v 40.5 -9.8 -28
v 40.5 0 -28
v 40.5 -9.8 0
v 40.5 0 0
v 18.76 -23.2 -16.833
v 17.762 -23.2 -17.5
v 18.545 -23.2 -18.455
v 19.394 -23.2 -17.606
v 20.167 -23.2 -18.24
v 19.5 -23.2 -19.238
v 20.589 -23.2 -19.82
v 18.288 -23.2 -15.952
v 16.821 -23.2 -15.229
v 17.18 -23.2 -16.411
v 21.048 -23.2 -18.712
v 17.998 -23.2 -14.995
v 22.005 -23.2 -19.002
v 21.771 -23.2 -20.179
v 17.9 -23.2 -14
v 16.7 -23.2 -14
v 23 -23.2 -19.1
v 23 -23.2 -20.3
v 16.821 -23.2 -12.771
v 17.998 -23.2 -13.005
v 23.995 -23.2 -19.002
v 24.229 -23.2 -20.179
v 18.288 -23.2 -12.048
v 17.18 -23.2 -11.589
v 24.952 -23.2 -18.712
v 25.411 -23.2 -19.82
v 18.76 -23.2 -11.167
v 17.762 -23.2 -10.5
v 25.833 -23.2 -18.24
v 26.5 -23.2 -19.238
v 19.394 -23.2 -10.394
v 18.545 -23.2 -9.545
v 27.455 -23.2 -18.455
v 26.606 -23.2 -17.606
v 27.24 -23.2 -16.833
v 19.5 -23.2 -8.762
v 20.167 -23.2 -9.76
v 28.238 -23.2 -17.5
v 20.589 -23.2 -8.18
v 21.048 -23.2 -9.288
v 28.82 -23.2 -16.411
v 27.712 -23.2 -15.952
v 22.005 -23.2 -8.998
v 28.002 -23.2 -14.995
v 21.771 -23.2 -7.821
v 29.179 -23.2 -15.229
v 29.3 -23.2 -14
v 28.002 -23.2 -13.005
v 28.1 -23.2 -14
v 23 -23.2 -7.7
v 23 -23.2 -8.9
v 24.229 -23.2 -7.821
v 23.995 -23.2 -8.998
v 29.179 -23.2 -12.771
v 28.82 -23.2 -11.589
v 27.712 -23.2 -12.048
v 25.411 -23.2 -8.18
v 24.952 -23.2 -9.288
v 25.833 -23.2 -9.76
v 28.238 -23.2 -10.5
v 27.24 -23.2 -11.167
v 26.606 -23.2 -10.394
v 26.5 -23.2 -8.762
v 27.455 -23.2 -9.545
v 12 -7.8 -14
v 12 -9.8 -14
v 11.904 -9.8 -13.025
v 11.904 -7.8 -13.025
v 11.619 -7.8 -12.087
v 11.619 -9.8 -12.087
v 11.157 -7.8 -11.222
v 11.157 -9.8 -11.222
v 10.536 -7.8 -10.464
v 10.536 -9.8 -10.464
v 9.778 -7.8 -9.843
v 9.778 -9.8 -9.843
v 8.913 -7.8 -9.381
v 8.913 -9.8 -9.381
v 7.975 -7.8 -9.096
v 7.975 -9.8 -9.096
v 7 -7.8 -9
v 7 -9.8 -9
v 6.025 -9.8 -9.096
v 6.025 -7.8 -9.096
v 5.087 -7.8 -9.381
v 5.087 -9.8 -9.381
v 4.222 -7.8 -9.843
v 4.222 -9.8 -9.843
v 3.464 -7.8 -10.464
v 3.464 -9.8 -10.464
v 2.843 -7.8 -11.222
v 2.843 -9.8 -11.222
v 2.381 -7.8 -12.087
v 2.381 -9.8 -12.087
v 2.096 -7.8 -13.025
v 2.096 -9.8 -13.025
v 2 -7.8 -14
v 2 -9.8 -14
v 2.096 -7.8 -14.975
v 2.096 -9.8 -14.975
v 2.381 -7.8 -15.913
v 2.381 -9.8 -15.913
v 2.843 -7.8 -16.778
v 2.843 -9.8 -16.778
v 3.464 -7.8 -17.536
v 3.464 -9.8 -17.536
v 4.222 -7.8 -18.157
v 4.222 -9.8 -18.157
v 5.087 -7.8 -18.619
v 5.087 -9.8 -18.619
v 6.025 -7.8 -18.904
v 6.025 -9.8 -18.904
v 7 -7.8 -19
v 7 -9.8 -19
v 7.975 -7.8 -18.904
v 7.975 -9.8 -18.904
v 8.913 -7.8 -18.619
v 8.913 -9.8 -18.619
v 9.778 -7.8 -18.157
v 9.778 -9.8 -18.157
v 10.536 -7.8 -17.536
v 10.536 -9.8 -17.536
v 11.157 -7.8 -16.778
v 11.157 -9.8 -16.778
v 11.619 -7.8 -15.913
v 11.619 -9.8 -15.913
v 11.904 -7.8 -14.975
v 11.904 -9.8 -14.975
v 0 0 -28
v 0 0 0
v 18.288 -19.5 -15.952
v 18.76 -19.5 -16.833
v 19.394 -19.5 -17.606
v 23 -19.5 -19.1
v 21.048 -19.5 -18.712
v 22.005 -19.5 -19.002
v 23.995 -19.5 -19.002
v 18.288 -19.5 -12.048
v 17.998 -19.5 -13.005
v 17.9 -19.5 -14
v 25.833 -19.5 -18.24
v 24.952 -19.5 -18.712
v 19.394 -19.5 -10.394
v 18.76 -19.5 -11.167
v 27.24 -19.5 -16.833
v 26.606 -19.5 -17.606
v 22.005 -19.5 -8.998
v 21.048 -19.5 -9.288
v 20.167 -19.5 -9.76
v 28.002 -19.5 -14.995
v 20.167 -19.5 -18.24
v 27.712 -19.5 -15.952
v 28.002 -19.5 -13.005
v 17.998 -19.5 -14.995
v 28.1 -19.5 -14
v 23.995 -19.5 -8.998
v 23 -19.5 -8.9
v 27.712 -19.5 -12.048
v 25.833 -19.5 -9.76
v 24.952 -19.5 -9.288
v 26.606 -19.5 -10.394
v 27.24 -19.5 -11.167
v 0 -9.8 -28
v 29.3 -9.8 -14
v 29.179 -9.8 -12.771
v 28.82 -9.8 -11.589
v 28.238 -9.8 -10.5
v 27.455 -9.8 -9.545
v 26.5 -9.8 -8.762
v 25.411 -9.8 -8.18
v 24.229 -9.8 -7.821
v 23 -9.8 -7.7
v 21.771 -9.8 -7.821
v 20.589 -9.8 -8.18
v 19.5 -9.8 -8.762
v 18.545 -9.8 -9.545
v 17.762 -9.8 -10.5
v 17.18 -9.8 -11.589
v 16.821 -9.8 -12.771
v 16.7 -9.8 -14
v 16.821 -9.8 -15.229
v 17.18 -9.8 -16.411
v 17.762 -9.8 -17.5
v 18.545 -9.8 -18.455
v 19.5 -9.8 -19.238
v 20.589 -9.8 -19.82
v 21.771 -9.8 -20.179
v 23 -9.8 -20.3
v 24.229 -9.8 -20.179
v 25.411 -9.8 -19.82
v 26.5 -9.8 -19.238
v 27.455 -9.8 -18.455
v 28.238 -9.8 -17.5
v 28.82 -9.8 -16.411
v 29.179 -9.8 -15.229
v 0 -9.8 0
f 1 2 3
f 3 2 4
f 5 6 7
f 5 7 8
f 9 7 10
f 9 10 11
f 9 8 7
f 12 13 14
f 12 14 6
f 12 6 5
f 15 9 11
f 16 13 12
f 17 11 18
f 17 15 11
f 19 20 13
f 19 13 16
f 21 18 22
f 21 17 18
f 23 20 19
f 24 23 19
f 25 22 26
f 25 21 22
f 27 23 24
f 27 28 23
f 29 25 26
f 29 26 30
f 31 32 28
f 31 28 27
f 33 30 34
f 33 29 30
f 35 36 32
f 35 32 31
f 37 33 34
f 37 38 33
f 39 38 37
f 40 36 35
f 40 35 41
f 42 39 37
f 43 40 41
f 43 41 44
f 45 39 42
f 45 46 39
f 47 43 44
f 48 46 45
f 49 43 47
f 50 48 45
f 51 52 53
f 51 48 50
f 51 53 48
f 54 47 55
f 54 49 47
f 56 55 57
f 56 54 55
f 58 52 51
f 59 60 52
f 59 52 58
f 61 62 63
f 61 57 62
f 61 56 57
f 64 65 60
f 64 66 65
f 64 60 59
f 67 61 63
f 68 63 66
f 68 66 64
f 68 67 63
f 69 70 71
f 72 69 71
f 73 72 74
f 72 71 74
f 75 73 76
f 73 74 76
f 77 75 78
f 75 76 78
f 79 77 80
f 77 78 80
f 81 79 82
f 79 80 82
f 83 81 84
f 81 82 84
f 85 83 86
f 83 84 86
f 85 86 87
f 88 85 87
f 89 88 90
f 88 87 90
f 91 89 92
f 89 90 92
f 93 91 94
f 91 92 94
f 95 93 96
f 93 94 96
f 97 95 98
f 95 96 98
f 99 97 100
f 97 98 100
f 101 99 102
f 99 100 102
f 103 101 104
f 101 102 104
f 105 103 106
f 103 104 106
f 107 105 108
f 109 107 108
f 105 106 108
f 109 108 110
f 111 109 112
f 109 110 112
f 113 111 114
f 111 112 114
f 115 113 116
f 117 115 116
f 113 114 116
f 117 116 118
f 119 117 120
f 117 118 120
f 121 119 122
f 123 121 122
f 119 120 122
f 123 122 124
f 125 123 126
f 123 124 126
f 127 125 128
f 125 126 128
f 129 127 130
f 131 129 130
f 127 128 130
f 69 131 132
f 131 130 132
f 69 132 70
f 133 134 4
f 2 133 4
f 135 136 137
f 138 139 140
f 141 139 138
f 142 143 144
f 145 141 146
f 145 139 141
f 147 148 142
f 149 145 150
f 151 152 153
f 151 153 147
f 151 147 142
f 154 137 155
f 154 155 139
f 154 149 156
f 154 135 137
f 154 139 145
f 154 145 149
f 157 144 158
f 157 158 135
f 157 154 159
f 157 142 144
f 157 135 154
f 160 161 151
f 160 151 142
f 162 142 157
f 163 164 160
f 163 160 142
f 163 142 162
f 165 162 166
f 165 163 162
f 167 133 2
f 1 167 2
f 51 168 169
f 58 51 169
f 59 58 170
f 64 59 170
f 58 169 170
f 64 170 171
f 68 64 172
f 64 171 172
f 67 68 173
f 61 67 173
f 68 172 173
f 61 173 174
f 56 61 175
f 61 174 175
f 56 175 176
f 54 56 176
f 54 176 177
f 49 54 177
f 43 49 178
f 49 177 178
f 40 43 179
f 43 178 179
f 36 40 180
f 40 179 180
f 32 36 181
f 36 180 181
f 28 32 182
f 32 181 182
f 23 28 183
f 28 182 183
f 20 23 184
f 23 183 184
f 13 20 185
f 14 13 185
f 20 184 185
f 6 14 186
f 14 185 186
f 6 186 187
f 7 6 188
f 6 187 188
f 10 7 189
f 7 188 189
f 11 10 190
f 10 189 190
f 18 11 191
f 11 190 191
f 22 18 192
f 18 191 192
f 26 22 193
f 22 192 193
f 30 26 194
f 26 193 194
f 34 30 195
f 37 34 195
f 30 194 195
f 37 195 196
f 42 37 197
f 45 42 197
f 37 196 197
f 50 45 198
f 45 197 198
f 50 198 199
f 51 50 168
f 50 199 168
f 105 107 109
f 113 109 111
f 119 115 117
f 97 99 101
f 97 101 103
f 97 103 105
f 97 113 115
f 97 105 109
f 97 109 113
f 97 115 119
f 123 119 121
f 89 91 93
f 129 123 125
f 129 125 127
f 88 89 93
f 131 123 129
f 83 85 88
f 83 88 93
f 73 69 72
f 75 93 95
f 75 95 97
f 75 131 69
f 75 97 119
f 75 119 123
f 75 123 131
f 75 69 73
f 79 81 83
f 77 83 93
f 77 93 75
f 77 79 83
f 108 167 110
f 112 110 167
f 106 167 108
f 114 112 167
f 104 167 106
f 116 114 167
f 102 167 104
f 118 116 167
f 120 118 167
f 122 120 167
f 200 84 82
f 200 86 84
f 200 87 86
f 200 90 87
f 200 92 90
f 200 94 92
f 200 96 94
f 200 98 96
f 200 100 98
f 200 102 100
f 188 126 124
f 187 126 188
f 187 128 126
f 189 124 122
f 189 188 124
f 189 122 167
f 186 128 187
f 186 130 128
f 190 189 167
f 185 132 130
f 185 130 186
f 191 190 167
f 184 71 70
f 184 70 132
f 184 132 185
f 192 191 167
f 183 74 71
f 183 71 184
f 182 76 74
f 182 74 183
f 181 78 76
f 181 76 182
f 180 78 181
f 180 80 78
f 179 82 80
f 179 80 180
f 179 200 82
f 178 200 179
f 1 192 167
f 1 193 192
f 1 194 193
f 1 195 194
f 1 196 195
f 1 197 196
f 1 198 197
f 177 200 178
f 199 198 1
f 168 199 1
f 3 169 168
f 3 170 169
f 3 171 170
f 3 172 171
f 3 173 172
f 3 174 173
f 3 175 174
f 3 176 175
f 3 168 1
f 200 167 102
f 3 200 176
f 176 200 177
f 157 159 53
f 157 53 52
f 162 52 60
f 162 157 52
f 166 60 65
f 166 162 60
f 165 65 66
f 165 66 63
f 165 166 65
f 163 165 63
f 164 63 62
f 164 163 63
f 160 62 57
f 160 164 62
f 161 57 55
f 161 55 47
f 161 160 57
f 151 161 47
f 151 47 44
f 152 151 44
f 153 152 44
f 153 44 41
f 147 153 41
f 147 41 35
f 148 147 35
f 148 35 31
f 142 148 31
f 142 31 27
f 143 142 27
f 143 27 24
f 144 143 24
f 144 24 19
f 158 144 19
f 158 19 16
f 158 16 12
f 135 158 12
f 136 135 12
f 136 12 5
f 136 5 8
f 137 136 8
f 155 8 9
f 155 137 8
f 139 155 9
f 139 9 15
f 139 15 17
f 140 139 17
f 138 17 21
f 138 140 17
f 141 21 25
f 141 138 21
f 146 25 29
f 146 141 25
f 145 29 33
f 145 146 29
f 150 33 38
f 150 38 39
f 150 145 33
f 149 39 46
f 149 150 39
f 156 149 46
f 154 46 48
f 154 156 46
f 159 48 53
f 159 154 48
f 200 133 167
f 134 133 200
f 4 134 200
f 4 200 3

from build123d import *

# Parameters (mm, degrees)
F0_W     = 40.5
F0_H     = 28
F1_DEPTH = 9.8
F2_R     = 6.3
F2_R_2   = 5.1
F3_DEPTH = 13.4
F4_DEPTH = 9.7
F5_R     = 5
F6_DEPTH = 2


# Not quite as in the source:
# - a feature of the source that left no trace in its solid (it failed there, or was rolled back) is left out


with BuildPart() as f1:
    # F0 (on Front) → F1 (new body)
    with BuildSketch(Plane.XZ):
        with Locations((20.25, -14)):
            Rectangle(F0_W, F0_H)
    extrude(amount=F1_DEPTH)

    # F2 (on face) → F3 (join)
    with BuildSketch(Plane.XZ.offset(9.8)):
        with Locations((23, -14)):
            Circle(F2_R)
        with Locations((23, -14)):
            Circle(F2_R_2, mode=Mode.SUBTRACT)
    extrude(amount=F3_DEPTH)

    # F4 (add): a face of the model
    f4_faces = [f1.faces().sort_by_distance(p)[0] for p in [
        (23, -9.8, -14),
    ]]
    extrude(f4_faces, amount=F4_DEPTH)

    # F5 (on face) → F6 (cut)
    with BuildSketch(Plane.XZ.offset(9.8)):
        with Locations((7, -14)):
            Circle(F5_R)
    extrude(amount=-F6_DEPTH, mode=Mode.SUBTRACT)


solid = f1.part
